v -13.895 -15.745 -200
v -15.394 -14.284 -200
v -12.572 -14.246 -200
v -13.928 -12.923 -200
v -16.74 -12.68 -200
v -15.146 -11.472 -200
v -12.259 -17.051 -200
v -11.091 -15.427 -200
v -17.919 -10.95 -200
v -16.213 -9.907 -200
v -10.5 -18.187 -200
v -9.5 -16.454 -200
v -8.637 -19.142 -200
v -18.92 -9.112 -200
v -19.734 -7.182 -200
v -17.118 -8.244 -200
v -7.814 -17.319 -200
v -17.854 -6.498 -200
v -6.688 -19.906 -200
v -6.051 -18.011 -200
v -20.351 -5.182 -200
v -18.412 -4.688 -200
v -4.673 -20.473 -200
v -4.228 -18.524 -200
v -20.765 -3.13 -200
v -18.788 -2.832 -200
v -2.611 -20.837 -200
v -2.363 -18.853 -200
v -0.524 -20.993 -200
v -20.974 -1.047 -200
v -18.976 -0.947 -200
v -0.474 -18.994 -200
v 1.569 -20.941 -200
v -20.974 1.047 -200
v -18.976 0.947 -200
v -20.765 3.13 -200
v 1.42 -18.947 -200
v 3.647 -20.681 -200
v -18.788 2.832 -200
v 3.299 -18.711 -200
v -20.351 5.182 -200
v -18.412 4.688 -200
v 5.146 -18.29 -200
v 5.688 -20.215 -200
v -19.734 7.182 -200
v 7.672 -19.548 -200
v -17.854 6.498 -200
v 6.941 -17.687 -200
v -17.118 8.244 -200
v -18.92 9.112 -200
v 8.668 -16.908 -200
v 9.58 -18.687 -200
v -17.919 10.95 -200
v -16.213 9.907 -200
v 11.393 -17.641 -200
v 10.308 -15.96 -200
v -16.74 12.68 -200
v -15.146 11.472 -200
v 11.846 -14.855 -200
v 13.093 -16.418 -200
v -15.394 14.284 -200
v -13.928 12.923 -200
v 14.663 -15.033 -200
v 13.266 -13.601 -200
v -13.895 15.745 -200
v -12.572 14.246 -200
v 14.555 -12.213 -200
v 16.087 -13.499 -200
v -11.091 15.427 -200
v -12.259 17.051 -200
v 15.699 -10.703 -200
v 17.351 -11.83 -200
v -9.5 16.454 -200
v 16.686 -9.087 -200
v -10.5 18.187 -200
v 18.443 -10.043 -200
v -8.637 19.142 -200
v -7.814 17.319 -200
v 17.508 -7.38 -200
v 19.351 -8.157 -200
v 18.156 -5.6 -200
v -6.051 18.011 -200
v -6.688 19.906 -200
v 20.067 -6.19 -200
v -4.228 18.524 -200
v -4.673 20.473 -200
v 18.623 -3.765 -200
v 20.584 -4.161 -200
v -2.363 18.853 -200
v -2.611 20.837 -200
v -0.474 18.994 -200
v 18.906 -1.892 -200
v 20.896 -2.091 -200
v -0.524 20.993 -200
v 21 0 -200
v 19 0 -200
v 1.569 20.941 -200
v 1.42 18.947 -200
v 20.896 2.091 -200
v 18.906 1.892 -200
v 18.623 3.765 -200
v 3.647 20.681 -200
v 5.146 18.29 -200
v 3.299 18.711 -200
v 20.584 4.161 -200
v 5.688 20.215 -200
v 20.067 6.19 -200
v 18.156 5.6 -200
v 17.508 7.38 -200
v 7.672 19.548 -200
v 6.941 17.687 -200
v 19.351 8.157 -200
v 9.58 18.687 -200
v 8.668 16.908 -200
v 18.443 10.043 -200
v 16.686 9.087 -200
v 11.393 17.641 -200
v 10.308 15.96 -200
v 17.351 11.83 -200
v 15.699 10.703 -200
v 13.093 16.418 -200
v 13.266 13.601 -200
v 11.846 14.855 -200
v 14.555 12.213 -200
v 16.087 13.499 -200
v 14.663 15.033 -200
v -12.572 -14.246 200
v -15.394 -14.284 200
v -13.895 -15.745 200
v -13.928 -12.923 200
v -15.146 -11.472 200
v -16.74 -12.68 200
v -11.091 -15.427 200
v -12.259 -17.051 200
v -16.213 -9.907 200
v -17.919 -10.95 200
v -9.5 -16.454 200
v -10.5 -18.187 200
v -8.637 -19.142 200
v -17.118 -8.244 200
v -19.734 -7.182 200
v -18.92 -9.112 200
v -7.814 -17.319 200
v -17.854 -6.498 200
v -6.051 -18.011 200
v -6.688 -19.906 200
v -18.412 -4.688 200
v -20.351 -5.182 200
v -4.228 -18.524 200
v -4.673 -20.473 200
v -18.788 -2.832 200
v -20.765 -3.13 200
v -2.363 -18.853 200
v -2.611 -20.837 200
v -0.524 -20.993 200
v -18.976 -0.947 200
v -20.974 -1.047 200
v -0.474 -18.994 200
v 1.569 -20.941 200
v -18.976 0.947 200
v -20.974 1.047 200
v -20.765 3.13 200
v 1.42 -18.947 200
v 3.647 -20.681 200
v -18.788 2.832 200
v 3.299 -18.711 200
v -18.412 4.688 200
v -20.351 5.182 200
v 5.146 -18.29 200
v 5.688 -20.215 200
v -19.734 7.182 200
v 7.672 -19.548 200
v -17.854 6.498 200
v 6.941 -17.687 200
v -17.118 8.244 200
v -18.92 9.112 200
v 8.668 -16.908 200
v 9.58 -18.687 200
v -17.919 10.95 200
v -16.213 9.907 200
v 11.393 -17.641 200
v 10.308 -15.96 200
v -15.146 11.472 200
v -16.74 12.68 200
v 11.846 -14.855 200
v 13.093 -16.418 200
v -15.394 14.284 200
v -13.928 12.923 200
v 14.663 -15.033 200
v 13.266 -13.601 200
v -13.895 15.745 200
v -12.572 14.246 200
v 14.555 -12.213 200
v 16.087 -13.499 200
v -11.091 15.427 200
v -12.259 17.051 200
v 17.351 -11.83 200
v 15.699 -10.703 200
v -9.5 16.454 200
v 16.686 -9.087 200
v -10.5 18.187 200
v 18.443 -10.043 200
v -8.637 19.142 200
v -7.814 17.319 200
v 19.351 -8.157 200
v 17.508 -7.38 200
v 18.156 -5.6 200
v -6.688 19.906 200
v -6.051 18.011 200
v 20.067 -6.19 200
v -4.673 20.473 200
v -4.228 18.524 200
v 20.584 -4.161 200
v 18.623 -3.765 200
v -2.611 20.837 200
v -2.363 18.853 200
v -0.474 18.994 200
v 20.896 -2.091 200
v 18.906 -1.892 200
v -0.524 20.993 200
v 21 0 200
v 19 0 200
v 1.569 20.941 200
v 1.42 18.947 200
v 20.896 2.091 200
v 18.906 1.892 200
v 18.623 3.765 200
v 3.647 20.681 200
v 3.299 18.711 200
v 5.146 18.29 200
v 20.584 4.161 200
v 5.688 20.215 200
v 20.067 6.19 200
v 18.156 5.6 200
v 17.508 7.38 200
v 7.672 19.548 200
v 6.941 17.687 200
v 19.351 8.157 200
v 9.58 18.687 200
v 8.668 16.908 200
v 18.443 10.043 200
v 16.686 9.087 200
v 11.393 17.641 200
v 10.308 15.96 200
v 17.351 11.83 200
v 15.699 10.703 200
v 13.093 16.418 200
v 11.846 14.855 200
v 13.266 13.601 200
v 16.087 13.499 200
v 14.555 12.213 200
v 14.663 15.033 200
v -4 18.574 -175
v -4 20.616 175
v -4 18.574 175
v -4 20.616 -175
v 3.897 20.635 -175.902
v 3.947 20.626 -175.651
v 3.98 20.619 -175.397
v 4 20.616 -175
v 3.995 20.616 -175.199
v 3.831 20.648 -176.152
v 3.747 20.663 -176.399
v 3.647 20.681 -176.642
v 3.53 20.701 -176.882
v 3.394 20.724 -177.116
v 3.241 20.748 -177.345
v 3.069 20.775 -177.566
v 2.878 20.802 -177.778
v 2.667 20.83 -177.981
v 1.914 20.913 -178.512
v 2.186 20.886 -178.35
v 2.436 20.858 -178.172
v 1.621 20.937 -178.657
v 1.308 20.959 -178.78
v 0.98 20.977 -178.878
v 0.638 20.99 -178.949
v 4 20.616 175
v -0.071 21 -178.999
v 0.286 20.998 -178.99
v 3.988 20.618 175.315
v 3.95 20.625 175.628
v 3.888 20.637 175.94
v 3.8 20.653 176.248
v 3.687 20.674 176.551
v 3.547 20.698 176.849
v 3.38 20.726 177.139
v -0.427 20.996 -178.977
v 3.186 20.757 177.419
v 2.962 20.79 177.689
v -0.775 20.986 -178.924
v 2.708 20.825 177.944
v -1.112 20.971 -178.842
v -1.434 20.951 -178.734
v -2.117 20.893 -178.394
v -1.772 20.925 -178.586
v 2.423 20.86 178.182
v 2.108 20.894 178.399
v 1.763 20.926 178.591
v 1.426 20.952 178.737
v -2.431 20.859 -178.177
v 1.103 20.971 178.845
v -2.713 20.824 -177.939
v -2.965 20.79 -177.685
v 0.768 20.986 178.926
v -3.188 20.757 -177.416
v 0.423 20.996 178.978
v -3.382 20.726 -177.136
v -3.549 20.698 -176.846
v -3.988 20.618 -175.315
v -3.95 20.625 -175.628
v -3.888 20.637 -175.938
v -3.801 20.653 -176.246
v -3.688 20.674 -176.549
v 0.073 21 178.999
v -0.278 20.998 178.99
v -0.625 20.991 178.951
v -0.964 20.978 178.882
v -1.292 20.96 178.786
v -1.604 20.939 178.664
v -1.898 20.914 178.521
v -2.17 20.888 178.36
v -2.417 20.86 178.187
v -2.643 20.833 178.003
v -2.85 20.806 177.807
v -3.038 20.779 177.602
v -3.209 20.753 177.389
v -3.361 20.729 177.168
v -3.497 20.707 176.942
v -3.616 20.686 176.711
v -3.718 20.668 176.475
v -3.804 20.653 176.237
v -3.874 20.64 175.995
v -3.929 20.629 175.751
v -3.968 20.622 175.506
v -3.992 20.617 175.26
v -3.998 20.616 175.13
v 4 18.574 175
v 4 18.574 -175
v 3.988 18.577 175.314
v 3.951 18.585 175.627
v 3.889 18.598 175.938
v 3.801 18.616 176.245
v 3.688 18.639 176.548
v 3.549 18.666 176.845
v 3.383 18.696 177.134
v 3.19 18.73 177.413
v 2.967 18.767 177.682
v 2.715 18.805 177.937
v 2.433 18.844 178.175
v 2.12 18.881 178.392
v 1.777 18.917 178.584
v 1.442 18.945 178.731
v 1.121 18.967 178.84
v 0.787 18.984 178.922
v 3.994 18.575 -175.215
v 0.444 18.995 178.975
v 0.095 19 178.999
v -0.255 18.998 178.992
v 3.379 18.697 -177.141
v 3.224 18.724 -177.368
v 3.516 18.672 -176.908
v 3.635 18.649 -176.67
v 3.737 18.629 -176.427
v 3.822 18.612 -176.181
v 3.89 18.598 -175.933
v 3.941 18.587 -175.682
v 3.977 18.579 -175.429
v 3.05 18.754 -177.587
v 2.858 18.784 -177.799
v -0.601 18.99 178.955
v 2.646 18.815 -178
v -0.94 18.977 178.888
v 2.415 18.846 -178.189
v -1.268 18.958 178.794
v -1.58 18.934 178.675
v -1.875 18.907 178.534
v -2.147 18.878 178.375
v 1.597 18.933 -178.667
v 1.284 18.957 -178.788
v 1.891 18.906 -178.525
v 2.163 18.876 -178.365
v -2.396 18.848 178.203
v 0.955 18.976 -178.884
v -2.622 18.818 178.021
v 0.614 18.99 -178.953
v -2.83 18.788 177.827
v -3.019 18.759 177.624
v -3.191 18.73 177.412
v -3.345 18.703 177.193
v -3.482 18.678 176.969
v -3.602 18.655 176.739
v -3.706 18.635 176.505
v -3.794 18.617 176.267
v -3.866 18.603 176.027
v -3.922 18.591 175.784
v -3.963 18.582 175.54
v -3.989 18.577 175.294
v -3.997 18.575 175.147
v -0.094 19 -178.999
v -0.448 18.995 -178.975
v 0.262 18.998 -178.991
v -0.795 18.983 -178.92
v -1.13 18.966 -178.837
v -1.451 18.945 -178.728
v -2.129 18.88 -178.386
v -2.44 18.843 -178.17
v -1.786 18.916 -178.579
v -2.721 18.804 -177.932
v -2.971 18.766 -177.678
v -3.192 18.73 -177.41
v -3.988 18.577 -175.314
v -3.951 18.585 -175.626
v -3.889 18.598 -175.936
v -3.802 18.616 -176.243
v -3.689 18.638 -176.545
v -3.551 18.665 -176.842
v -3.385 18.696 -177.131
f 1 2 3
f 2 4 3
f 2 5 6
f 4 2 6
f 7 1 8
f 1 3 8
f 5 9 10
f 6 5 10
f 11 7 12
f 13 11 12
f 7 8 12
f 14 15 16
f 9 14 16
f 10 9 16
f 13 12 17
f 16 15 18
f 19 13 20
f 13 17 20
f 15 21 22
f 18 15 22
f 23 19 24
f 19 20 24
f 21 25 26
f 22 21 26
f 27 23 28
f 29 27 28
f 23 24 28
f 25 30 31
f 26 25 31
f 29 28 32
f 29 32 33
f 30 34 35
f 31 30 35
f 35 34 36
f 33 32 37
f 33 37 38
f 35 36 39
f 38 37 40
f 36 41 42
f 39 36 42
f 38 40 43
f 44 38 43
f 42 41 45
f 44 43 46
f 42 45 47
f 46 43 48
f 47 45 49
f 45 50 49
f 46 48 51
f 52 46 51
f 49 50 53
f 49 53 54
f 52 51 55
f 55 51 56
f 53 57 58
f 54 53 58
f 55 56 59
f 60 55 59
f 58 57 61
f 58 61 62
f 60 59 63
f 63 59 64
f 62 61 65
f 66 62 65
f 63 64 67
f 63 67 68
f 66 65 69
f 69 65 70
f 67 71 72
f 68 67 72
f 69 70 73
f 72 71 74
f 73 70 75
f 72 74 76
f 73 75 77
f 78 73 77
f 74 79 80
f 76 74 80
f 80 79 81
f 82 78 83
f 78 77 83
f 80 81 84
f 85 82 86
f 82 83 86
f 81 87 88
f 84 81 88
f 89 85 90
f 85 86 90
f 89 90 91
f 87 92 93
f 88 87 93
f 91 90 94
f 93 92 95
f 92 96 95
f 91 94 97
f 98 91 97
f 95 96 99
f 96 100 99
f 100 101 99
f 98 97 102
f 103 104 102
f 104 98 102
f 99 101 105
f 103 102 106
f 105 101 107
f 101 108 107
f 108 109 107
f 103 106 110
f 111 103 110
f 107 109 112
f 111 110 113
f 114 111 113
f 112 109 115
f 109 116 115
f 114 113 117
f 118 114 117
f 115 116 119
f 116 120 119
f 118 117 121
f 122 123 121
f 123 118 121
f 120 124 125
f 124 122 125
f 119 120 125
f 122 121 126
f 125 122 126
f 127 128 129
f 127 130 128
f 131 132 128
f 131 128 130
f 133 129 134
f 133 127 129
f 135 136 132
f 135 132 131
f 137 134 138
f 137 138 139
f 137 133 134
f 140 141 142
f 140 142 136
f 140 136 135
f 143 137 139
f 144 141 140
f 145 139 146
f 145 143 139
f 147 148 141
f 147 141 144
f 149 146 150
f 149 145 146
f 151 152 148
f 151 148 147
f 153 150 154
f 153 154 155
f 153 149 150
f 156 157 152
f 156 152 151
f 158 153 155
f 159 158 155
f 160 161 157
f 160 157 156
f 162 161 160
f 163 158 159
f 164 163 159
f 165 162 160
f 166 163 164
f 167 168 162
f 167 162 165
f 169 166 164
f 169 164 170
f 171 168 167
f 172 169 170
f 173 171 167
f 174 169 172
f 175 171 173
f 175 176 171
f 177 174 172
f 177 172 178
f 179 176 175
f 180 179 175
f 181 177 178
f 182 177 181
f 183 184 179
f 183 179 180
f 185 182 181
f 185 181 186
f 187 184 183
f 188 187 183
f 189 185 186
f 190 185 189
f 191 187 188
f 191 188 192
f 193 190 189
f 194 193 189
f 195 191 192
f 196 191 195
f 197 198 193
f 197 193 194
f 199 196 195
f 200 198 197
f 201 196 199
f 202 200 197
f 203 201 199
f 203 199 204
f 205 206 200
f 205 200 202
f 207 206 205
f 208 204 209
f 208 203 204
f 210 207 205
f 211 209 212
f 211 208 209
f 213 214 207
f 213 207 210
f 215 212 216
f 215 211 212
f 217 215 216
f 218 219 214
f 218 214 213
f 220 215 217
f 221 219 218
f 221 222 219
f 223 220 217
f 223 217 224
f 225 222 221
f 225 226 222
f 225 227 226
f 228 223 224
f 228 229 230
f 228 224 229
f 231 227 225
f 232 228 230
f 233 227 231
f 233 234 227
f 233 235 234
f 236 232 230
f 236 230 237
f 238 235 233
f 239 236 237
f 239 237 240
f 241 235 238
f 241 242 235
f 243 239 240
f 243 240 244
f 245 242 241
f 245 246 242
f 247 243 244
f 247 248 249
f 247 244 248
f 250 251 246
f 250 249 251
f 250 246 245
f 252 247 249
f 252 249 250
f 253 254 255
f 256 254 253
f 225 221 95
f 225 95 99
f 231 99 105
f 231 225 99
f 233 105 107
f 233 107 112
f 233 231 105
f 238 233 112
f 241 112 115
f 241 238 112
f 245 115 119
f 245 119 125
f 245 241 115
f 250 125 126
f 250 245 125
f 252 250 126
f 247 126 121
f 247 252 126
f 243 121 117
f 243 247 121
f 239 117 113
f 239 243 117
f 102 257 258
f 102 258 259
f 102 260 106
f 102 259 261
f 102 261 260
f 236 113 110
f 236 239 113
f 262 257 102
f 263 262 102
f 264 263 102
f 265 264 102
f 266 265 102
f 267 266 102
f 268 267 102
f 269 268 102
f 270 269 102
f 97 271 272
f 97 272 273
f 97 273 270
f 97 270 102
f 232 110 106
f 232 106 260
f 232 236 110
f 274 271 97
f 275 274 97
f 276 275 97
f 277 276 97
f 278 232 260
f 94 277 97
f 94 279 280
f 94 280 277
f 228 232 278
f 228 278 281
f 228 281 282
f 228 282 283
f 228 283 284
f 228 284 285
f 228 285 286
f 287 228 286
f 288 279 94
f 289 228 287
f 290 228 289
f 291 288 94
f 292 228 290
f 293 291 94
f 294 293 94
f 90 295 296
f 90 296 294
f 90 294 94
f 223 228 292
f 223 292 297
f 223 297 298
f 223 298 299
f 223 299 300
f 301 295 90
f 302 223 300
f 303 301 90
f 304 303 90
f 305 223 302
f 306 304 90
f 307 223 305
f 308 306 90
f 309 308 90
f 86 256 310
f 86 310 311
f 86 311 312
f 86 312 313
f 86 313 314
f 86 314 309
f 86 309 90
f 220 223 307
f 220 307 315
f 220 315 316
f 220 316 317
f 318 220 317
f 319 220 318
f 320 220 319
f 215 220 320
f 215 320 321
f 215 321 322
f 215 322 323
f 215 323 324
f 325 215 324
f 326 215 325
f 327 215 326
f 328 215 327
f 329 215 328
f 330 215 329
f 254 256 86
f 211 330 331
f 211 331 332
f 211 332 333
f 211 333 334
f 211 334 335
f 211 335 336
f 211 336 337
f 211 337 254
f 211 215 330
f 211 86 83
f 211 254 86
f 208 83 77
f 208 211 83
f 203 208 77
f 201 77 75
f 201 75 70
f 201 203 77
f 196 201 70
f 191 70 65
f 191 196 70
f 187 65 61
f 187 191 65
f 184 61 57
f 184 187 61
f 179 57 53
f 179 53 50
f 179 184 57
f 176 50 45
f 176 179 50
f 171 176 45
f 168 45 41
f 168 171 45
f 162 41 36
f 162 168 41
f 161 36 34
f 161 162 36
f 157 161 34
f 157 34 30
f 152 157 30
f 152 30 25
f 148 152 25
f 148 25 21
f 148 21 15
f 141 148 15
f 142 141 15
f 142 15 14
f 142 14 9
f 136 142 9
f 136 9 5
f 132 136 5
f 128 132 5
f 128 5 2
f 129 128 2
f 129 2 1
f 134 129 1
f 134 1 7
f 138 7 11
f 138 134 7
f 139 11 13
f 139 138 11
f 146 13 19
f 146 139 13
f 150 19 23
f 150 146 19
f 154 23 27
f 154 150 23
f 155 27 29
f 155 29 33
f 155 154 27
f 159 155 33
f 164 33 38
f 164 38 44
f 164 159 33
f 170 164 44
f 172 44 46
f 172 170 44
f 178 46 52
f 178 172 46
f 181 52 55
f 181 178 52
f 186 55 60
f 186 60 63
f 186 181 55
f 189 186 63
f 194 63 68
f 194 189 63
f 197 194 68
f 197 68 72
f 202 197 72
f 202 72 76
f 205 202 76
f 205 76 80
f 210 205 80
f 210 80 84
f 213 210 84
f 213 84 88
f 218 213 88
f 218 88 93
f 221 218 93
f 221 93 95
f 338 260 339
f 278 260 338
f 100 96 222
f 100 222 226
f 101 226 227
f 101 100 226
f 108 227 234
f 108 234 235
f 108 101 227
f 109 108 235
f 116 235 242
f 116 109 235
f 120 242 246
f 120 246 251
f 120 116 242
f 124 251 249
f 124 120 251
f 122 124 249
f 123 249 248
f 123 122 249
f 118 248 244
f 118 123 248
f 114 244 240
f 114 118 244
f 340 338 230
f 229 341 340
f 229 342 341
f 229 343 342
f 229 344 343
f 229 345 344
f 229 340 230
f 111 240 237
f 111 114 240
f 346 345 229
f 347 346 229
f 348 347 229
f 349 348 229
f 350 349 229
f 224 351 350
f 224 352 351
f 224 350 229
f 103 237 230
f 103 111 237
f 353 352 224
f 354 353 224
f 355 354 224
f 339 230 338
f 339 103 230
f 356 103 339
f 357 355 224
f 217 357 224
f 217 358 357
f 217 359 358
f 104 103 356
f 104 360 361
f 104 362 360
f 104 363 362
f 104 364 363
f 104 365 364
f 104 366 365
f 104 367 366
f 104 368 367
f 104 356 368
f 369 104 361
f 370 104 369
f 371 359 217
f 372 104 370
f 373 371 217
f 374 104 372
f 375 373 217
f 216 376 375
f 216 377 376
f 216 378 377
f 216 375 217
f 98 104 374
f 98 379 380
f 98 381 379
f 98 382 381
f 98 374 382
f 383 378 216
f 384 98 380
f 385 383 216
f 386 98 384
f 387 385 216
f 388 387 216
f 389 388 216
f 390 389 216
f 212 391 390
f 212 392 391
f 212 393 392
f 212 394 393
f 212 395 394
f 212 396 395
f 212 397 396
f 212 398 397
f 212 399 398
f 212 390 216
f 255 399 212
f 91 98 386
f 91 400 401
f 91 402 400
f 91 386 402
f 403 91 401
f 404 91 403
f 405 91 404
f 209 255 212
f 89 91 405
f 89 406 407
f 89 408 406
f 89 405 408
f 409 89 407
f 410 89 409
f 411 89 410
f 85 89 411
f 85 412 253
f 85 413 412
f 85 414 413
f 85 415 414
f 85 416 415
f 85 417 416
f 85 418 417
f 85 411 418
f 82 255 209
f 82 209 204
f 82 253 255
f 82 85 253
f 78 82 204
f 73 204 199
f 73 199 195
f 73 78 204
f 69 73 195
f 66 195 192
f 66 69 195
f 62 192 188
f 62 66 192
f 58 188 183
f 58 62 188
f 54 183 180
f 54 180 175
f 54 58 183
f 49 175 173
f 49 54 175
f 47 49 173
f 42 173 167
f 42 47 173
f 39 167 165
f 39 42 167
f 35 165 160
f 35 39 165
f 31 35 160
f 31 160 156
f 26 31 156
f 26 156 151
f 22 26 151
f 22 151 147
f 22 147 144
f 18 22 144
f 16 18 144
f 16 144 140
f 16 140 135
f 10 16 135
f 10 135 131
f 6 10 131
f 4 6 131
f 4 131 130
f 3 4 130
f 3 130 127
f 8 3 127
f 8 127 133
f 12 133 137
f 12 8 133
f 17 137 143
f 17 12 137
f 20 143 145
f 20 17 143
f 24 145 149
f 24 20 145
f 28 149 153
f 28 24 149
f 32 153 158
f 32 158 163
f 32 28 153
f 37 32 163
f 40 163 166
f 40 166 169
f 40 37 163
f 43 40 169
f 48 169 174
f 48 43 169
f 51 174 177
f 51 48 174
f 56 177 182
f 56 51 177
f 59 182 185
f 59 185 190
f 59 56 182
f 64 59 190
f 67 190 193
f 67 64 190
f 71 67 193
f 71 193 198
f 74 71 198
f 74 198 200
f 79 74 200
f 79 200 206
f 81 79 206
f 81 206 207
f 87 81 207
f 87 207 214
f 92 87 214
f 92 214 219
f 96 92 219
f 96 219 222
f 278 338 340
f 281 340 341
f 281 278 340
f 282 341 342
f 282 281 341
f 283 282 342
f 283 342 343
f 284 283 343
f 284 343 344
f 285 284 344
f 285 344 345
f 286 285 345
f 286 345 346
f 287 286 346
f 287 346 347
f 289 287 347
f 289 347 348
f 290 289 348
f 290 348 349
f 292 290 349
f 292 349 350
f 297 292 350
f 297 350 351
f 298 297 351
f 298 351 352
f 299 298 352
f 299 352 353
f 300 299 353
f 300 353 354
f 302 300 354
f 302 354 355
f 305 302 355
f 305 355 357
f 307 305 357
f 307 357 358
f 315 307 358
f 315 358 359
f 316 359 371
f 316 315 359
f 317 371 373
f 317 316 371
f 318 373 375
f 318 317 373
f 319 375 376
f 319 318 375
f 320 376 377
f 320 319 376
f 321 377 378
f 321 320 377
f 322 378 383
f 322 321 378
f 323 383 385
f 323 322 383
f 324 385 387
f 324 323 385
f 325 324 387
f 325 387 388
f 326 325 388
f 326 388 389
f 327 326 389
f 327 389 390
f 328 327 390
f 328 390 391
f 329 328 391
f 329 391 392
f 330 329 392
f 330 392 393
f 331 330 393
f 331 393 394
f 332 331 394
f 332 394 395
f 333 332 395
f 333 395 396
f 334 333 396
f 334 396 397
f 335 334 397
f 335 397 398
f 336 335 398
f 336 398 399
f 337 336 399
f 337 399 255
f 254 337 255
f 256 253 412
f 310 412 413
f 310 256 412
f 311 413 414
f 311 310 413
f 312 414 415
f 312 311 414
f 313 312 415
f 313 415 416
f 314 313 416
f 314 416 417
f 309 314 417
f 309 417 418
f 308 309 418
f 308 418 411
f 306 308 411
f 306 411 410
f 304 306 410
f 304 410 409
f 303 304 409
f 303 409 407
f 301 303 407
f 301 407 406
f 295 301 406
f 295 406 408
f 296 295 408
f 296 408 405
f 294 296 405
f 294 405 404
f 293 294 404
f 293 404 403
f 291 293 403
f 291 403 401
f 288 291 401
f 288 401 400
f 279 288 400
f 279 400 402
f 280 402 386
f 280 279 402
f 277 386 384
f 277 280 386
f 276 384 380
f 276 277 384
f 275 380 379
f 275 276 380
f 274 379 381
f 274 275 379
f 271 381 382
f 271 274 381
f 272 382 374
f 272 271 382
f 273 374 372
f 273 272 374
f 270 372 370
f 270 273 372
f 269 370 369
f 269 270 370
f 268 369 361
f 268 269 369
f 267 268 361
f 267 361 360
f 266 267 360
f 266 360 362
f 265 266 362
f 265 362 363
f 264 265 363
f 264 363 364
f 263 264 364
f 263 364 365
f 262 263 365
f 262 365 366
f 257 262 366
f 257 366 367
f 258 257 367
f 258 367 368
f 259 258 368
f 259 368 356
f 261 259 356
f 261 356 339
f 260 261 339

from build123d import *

# Parameters (mm, degrees)
SKETCH1_R           = 21
SKETCH1_R_2         = 19
BOSS_EXTRUDE1_DEPTH = 200
CUT_EXTRUDE1_REACH  = 45


with BuildPart() as part:
    # Sketch1 → Boss-Extrude1 (new body, symmetric)
    with BuildSketch(Plane.XY):
        Circle(SKETCH1_R)
        Circle(SKETCH1_R_2, mode=Mode.SUBTRACT)
    extrude(amount=BOSS_EXTRUDE1_DEPTH, both=True)

    # Sketch2 → Cut-Extrude1 (cut, up to next)
    with BuildSketch(Plane(origin=(0, 22, 0), x_dir=(1, 0, 0), z_dir=(0, 1, 0)), mode=Mode.PRIVATE) as cut_extrude1_sk1:
        with BuildLine():
            Line((-4, -175), (-4, 175))
            ThreePointArc((-4, 175), (0, 179), (4, 175))
            Line((4, 175), (4, -175))
            ThreePointArc((4, -175), (0, -179), (-4, -175))
        make_face()
    cut_extrude1_tool1 = extrude(cut_extrude1_sk1.sketch, amount=-CUT_EXTRUDE1_REACH, mode=Mode.PRIVATE) & part.part
    add(cut_extrude1_tool1.solids().sort_by_distance((0, 22, 0))[0], mode=Mode.SUBTRACT)


solid = part.part
